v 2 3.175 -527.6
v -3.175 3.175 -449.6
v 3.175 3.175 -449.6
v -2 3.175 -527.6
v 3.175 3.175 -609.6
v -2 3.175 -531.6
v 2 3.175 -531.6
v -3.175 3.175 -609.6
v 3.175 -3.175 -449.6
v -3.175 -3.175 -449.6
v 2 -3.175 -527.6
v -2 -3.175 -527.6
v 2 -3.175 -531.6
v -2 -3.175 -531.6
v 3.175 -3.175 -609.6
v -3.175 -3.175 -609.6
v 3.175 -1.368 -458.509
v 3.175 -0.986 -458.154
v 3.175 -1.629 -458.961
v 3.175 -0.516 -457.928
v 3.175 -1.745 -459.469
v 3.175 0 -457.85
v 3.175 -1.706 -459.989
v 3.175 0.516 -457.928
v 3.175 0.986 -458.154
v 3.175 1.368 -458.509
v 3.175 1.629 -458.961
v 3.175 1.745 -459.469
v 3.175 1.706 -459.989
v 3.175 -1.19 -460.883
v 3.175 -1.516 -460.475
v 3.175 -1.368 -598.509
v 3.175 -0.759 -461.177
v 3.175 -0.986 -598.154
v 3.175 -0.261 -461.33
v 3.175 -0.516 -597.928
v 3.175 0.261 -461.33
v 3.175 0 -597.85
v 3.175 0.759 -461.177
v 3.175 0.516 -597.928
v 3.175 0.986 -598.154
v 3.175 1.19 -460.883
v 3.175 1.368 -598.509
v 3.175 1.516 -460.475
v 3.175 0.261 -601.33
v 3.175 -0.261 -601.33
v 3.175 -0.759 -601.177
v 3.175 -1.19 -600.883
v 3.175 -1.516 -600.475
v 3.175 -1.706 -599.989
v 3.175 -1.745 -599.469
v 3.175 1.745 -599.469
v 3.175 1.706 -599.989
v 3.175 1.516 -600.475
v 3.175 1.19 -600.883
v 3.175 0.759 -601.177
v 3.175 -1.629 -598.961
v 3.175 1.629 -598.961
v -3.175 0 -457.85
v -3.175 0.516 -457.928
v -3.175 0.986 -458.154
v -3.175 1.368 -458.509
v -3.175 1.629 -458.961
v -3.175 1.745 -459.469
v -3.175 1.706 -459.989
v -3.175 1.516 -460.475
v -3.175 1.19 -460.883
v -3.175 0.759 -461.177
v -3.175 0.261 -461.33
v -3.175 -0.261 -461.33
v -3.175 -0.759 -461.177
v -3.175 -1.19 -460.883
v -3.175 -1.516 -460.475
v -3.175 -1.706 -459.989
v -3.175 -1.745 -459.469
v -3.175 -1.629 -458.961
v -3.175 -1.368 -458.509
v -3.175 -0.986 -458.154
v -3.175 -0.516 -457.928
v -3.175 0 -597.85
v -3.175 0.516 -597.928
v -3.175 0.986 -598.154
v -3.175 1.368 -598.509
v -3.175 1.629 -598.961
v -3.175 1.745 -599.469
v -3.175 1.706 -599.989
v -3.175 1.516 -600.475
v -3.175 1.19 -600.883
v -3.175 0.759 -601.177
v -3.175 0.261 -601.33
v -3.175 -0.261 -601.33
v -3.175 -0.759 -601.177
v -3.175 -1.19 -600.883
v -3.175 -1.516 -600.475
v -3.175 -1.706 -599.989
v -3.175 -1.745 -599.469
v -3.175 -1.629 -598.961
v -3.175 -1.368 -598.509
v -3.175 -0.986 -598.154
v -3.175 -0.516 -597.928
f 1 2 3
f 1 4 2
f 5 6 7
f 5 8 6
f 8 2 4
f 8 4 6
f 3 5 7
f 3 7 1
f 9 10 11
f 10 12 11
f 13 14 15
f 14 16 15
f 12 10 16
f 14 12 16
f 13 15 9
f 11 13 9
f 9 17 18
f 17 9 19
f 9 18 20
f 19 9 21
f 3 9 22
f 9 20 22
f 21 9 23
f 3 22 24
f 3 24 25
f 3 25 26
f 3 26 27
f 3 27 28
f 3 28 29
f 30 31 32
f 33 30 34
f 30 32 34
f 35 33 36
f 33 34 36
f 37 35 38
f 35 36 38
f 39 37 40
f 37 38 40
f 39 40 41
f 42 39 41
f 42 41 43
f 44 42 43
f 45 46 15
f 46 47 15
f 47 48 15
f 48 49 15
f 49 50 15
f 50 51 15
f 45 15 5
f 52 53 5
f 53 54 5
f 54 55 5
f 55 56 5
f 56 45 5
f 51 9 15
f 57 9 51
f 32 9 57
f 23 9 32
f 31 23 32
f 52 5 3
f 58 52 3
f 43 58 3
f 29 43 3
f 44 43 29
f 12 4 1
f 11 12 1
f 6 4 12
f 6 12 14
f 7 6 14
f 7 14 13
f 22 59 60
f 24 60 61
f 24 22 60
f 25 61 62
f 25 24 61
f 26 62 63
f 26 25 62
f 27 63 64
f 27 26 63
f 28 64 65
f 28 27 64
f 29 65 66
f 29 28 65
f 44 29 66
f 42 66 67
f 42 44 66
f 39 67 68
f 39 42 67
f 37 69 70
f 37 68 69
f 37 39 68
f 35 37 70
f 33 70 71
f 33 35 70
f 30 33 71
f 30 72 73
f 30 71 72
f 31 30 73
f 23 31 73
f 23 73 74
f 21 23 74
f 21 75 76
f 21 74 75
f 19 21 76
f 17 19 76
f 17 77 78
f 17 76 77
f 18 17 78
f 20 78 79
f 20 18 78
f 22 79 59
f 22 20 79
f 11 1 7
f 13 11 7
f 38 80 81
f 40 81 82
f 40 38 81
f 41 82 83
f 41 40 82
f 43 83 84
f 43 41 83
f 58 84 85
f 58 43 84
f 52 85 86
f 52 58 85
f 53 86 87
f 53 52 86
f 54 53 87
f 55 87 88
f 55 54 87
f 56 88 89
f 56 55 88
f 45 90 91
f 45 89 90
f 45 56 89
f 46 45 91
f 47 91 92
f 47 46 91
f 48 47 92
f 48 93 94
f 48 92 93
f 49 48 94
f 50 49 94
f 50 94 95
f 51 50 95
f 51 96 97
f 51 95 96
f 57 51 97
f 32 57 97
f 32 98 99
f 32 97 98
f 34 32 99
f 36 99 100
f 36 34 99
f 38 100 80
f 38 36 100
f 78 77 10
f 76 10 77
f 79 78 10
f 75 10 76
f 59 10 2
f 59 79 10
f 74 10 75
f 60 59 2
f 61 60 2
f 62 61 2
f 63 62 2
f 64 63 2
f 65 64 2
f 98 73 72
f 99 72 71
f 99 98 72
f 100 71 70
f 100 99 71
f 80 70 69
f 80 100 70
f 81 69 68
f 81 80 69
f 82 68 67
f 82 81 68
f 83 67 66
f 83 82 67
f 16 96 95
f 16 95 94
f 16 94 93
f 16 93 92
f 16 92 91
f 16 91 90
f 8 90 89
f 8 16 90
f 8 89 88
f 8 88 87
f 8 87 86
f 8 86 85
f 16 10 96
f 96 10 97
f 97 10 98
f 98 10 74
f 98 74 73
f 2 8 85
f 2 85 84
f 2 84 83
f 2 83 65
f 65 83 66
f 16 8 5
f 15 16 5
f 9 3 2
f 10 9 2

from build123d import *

# Parameters (mm, degrees)
BOSS_EXTRUDE1_DEPTH      = 609.6
BOSS_EXTRUDE1_DEPTH_BACK = 609.6
SKETCH3_W                = 6.35
SKETCH3_H                = 6.35
SKETCH4_W                = 7.35
SKETCH4_H                = 7.35
CUT_EXTRUDE1_DEPTH       = 1060.209517164
SKETCH5_R                = 1.75
CUT_EXTRUDE2_DEPTH       = 610.641339744
SKETCH6_W                = 4
SKETCH6_H                = 4
CUT_EXTRUDE3_DEPTH       = 610.641339744


with BuildPart() as part:
    # Sketch3 → Boss-Extrude1 (new, two sides: drawn at the far end of the back side and taken through both)
    with BuildSketch(Plane.XY.offset(-BOSS_EXTRUDE1_DEPTH_BACK)):
        Rectangle(SKETCH3_W, SKETCH3_H)
    extrude(amount=BOSS_EXTRUDE1_DEPTH + BOSS_EXTRUDE1_DEPTH_BACK)

    # Sketch4 → Cut-Extrude1 (cut, through all)
    with BuildSketch(Plane(origin=(0, 0, -449.6), x_dir=(-1, 0, 0), z_dir=(0, 0, -1))):
        Rectangle(SKETCH4_W, SKETCH4_H)
    extrude(amount=-CUT_EXTRUDE1_DEPTH, mode=Mode.SUBTRACT)

    # Sketch5 → Cut-Extrude2 (cut, through all)
    with BuildSketch(Plane(origin=(3.175, 0, 0), x_dir=(0, 1, 0), z_dir=(-1, 0, 0))):
        with Locations(Location((0, 599.6, 0), (0, 0, 270))):
            Circle(SKETCH5_R)
        with Locations(Location((0, 459.6, 0), (0, 0, 270))):
            Circle(SKETCH5_R)
    extrude(amount=CUT_EXTRUDE2_DEPTH, mode=Mode.SUBTRACT)

    # Sketch6 → Cut-Extrude3 (cut, through all)
    with BuildSketch(Plane(origin=(0, 3.175, 0), x_dir=(1, 0, 0), z_dir=(0, 1, 0))):
        with Locations((0, 529.6)):
            Rectangle(SKETCH6_W, SKETCH6_H)
    extrude(amount=-CUT_EXTRUDE3_DEPTH, mode=Mode.SUBTRACT)


solid = part.part
